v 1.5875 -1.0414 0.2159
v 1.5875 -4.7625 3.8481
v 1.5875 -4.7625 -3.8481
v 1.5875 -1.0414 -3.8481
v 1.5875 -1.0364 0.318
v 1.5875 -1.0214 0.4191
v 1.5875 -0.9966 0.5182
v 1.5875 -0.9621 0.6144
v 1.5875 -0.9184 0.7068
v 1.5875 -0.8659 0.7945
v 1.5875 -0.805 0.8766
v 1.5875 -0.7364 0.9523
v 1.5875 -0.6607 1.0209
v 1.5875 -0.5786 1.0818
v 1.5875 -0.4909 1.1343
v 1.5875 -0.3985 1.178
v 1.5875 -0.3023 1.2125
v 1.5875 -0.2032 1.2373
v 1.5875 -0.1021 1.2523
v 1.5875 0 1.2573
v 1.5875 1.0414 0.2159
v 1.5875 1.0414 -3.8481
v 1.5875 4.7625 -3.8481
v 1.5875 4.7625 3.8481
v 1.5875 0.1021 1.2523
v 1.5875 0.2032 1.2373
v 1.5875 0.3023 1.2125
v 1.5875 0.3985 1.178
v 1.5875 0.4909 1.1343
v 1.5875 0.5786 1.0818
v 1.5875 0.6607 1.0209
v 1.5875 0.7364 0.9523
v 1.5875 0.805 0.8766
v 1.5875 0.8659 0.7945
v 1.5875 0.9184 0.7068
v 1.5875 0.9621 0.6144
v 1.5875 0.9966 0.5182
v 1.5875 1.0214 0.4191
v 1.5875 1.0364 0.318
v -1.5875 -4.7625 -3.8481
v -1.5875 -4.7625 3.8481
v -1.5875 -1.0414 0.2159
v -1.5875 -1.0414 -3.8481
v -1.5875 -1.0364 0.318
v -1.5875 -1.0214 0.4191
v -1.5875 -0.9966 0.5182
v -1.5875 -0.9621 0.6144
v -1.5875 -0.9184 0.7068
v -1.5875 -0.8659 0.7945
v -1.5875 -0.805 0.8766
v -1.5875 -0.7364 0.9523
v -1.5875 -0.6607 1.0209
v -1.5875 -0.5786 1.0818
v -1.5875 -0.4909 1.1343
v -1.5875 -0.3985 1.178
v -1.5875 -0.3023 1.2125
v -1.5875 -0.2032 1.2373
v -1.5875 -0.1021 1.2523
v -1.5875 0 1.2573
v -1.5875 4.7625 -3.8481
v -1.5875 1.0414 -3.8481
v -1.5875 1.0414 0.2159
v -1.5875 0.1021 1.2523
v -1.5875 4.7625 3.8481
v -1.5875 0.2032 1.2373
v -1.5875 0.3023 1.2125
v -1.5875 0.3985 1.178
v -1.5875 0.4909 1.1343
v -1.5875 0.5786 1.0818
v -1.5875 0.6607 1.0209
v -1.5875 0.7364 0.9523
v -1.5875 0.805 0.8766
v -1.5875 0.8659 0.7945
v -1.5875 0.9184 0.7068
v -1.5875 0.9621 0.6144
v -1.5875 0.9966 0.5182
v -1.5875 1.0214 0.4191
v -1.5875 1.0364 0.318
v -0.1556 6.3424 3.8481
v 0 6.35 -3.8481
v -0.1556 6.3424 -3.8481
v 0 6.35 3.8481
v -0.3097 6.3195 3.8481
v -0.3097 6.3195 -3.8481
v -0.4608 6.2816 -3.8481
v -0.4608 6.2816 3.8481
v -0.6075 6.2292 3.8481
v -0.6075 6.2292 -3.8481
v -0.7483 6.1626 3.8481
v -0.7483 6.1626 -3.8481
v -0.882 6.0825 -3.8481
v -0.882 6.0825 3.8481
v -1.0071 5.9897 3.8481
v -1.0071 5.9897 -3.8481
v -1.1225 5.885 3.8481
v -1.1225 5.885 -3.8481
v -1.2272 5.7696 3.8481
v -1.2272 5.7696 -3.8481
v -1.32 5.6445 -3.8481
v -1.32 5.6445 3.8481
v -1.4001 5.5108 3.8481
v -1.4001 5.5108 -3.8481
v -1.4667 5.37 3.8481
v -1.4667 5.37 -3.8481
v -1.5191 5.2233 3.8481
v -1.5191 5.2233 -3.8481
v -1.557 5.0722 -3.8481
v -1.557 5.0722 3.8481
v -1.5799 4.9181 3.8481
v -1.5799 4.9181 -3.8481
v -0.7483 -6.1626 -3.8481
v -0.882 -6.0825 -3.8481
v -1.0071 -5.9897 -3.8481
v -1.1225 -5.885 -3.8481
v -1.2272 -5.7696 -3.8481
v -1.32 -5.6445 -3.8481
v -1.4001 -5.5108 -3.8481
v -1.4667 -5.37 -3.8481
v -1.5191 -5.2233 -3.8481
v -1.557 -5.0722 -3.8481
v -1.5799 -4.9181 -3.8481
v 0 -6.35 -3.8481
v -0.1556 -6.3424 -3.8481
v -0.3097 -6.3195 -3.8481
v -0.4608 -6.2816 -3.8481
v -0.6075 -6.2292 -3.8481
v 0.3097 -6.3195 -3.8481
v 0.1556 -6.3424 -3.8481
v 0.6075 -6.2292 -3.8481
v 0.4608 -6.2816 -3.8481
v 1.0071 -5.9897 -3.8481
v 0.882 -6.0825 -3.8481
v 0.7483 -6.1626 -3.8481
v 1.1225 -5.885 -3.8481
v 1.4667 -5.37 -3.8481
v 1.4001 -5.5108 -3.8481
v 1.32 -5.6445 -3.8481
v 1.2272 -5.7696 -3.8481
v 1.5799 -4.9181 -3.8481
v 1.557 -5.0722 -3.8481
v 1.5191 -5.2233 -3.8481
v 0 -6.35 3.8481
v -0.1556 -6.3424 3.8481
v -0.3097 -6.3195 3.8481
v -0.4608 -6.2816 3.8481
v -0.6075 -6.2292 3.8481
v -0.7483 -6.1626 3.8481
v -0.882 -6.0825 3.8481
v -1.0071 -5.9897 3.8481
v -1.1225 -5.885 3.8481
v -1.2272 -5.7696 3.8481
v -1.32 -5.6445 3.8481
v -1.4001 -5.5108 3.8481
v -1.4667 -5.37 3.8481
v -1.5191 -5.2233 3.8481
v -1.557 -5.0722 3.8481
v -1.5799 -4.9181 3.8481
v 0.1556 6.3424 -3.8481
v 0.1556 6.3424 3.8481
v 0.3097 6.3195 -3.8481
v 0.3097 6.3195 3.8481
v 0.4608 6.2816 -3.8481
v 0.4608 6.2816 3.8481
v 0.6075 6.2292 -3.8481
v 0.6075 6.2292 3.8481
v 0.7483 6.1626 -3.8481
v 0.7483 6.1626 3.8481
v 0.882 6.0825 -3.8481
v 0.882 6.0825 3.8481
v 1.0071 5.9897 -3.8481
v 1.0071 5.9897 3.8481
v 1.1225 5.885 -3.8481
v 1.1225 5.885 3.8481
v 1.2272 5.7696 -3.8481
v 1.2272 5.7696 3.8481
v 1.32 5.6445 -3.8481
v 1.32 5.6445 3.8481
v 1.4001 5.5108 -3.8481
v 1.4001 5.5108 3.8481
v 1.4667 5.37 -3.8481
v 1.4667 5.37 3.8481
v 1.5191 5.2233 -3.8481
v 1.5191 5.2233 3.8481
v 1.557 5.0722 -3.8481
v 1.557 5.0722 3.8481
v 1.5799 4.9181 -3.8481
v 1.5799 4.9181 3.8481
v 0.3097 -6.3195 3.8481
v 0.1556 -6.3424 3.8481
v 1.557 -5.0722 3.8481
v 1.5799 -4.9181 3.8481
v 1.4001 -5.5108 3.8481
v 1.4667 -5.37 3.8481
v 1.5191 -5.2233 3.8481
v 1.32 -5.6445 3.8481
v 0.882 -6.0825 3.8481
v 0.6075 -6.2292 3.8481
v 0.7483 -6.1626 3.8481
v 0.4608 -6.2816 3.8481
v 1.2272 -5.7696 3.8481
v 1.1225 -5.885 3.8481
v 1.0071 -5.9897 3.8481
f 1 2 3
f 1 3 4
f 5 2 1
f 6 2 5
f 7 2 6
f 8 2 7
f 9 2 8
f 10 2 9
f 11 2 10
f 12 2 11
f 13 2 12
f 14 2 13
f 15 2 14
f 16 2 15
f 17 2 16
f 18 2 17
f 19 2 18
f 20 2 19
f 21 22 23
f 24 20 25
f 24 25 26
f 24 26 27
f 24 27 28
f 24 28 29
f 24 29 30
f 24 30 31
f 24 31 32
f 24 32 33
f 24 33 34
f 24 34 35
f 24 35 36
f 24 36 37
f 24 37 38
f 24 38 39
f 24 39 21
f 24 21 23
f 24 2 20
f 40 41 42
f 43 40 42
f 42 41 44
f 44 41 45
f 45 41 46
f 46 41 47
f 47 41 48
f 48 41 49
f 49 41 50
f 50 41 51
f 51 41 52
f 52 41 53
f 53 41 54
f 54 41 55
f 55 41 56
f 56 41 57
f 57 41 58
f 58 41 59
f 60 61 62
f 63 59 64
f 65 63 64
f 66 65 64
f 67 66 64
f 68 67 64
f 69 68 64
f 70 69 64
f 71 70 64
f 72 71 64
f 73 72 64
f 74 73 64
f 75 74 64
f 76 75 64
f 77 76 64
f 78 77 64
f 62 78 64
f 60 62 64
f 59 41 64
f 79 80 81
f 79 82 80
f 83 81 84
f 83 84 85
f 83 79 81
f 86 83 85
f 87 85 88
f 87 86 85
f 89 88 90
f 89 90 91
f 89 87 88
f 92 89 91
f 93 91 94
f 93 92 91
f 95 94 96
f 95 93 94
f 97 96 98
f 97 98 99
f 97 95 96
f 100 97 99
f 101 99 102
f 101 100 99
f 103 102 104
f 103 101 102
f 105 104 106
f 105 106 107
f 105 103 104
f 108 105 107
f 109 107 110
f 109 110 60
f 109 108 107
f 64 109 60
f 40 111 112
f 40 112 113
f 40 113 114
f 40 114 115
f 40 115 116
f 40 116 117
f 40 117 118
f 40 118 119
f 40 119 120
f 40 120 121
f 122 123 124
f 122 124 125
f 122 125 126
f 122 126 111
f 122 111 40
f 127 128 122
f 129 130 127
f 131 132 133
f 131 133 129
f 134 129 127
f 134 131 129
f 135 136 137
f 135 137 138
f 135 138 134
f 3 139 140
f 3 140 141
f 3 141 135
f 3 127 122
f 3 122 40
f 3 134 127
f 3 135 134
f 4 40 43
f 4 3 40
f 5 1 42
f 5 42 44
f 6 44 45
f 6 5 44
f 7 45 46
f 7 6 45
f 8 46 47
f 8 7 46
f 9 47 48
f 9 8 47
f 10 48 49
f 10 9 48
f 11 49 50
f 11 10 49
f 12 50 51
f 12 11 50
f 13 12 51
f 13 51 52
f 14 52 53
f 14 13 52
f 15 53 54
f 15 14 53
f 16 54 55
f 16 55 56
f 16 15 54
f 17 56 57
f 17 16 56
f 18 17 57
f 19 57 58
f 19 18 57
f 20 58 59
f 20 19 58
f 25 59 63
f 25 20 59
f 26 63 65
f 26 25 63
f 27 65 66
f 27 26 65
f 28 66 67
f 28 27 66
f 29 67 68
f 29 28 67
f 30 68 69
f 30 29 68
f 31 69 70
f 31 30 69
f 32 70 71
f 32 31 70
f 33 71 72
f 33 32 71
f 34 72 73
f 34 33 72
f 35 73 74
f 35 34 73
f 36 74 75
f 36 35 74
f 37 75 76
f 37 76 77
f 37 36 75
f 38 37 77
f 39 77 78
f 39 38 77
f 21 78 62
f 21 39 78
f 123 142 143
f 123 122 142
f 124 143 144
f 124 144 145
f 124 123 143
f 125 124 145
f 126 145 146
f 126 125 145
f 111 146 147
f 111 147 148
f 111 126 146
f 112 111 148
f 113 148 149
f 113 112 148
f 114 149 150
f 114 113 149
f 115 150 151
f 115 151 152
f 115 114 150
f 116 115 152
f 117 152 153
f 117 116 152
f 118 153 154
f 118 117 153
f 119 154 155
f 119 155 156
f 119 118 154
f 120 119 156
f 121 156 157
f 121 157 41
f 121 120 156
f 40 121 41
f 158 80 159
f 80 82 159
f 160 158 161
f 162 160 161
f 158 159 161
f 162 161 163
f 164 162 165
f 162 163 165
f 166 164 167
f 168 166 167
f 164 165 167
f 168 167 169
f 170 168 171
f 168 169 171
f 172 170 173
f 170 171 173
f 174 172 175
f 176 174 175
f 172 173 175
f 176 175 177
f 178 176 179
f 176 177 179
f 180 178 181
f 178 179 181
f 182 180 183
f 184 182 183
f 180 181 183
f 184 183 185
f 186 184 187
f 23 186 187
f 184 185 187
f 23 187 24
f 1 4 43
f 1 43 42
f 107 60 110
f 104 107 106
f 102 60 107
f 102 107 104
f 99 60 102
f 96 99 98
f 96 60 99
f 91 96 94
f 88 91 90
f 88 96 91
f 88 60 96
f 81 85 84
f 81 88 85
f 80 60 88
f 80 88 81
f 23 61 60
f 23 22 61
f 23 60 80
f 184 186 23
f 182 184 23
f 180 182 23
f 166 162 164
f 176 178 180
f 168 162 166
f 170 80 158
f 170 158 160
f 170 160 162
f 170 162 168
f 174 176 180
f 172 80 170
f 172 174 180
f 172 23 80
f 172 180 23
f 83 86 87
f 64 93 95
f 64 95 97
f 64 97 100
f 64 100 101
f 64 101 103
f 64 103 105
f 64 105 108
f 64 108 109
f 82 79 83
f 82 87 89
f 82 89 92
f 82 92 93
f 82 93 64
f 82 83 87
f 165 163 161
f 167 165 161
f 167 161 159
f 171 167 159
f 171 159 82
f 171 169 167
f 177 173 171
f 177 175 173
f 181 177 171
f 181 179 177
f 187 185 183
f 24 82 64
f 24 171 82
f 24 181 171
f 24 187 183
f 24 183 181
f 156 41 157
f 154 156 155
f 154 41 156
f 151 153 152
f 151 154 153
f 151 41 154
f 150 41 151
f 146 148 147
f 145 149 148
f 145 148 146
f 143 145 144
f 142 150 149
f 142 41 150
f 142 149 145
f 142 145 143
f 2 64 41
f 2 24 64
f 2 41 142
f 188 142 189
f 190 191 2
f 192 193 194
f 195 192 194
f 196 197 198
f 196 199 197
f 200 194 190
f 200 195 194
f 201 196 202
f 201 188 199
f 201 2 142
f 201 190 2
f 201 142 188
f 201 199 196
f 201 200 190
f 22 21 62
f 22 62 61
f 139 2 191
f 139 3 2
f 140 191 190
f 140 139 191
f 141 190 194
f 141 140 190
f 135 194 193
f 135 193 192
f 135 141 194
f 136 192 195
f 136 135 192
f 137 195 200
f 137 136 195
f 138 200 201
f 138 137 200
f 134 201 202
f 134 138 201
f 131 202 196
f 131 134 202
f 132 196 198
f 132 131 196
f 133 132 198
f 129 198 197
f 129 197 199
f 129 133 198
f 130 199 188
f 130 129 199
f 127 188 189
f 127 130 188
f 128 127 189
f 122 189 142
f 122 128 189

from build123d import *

# Parameters (mm, degrees)
F1_DEPTH = 1.5875
F2_R     = 1.58749


# Not quite as in the source:
# - a fillet or chamfer is up to 0.001 mm smaller than in the source, because OpenCascade refuses the exact size


with BuildPart() as f1:
    # F0 (on Right) → F1 (new body, symmetric)
    with BuildSketch(Plane.YZ):
        with BuildLine():
            Line((6.35, 3.8481), (-6.35, 3.8481))
            Line((-6.35, 3.8481), (-6.35, -3.8481))
            Line((-6.35, -3.8481), (-1.0414, -3.8481))
            Line((-1.0414, -3.8481), (-1.0414, 0.2159))
            ThreePointArc((-1.0414, 0.2159), (0, 1.2573), (1.0414, 0.2159))
            Line((1.0414, 0.2159), (1.0414, -3.8481))
            Line((1.0414, -3.8481), (6.35, -3.8481))
            Line((6.35, -3.8481), (6.35, 3.8481))
        make_face()
    extrude(amount=F1_DEPTH, both=True)

    # F2 (radius 1.5875 in the source; OpenCascade refuses exactly that, so slightly less here)
    f2_edges = [f1.edges().sort_by_distance(p)[0] for p in [
        (-1.5875, -6.35, 0),
        (1.5875, -6.35, 0),
        (1.5875, 6.35, 0),
        (-1.5875, 6.35, 0),
    ]]
    fillet(f2_edges, radius=F2_R)


solid = f1.part
